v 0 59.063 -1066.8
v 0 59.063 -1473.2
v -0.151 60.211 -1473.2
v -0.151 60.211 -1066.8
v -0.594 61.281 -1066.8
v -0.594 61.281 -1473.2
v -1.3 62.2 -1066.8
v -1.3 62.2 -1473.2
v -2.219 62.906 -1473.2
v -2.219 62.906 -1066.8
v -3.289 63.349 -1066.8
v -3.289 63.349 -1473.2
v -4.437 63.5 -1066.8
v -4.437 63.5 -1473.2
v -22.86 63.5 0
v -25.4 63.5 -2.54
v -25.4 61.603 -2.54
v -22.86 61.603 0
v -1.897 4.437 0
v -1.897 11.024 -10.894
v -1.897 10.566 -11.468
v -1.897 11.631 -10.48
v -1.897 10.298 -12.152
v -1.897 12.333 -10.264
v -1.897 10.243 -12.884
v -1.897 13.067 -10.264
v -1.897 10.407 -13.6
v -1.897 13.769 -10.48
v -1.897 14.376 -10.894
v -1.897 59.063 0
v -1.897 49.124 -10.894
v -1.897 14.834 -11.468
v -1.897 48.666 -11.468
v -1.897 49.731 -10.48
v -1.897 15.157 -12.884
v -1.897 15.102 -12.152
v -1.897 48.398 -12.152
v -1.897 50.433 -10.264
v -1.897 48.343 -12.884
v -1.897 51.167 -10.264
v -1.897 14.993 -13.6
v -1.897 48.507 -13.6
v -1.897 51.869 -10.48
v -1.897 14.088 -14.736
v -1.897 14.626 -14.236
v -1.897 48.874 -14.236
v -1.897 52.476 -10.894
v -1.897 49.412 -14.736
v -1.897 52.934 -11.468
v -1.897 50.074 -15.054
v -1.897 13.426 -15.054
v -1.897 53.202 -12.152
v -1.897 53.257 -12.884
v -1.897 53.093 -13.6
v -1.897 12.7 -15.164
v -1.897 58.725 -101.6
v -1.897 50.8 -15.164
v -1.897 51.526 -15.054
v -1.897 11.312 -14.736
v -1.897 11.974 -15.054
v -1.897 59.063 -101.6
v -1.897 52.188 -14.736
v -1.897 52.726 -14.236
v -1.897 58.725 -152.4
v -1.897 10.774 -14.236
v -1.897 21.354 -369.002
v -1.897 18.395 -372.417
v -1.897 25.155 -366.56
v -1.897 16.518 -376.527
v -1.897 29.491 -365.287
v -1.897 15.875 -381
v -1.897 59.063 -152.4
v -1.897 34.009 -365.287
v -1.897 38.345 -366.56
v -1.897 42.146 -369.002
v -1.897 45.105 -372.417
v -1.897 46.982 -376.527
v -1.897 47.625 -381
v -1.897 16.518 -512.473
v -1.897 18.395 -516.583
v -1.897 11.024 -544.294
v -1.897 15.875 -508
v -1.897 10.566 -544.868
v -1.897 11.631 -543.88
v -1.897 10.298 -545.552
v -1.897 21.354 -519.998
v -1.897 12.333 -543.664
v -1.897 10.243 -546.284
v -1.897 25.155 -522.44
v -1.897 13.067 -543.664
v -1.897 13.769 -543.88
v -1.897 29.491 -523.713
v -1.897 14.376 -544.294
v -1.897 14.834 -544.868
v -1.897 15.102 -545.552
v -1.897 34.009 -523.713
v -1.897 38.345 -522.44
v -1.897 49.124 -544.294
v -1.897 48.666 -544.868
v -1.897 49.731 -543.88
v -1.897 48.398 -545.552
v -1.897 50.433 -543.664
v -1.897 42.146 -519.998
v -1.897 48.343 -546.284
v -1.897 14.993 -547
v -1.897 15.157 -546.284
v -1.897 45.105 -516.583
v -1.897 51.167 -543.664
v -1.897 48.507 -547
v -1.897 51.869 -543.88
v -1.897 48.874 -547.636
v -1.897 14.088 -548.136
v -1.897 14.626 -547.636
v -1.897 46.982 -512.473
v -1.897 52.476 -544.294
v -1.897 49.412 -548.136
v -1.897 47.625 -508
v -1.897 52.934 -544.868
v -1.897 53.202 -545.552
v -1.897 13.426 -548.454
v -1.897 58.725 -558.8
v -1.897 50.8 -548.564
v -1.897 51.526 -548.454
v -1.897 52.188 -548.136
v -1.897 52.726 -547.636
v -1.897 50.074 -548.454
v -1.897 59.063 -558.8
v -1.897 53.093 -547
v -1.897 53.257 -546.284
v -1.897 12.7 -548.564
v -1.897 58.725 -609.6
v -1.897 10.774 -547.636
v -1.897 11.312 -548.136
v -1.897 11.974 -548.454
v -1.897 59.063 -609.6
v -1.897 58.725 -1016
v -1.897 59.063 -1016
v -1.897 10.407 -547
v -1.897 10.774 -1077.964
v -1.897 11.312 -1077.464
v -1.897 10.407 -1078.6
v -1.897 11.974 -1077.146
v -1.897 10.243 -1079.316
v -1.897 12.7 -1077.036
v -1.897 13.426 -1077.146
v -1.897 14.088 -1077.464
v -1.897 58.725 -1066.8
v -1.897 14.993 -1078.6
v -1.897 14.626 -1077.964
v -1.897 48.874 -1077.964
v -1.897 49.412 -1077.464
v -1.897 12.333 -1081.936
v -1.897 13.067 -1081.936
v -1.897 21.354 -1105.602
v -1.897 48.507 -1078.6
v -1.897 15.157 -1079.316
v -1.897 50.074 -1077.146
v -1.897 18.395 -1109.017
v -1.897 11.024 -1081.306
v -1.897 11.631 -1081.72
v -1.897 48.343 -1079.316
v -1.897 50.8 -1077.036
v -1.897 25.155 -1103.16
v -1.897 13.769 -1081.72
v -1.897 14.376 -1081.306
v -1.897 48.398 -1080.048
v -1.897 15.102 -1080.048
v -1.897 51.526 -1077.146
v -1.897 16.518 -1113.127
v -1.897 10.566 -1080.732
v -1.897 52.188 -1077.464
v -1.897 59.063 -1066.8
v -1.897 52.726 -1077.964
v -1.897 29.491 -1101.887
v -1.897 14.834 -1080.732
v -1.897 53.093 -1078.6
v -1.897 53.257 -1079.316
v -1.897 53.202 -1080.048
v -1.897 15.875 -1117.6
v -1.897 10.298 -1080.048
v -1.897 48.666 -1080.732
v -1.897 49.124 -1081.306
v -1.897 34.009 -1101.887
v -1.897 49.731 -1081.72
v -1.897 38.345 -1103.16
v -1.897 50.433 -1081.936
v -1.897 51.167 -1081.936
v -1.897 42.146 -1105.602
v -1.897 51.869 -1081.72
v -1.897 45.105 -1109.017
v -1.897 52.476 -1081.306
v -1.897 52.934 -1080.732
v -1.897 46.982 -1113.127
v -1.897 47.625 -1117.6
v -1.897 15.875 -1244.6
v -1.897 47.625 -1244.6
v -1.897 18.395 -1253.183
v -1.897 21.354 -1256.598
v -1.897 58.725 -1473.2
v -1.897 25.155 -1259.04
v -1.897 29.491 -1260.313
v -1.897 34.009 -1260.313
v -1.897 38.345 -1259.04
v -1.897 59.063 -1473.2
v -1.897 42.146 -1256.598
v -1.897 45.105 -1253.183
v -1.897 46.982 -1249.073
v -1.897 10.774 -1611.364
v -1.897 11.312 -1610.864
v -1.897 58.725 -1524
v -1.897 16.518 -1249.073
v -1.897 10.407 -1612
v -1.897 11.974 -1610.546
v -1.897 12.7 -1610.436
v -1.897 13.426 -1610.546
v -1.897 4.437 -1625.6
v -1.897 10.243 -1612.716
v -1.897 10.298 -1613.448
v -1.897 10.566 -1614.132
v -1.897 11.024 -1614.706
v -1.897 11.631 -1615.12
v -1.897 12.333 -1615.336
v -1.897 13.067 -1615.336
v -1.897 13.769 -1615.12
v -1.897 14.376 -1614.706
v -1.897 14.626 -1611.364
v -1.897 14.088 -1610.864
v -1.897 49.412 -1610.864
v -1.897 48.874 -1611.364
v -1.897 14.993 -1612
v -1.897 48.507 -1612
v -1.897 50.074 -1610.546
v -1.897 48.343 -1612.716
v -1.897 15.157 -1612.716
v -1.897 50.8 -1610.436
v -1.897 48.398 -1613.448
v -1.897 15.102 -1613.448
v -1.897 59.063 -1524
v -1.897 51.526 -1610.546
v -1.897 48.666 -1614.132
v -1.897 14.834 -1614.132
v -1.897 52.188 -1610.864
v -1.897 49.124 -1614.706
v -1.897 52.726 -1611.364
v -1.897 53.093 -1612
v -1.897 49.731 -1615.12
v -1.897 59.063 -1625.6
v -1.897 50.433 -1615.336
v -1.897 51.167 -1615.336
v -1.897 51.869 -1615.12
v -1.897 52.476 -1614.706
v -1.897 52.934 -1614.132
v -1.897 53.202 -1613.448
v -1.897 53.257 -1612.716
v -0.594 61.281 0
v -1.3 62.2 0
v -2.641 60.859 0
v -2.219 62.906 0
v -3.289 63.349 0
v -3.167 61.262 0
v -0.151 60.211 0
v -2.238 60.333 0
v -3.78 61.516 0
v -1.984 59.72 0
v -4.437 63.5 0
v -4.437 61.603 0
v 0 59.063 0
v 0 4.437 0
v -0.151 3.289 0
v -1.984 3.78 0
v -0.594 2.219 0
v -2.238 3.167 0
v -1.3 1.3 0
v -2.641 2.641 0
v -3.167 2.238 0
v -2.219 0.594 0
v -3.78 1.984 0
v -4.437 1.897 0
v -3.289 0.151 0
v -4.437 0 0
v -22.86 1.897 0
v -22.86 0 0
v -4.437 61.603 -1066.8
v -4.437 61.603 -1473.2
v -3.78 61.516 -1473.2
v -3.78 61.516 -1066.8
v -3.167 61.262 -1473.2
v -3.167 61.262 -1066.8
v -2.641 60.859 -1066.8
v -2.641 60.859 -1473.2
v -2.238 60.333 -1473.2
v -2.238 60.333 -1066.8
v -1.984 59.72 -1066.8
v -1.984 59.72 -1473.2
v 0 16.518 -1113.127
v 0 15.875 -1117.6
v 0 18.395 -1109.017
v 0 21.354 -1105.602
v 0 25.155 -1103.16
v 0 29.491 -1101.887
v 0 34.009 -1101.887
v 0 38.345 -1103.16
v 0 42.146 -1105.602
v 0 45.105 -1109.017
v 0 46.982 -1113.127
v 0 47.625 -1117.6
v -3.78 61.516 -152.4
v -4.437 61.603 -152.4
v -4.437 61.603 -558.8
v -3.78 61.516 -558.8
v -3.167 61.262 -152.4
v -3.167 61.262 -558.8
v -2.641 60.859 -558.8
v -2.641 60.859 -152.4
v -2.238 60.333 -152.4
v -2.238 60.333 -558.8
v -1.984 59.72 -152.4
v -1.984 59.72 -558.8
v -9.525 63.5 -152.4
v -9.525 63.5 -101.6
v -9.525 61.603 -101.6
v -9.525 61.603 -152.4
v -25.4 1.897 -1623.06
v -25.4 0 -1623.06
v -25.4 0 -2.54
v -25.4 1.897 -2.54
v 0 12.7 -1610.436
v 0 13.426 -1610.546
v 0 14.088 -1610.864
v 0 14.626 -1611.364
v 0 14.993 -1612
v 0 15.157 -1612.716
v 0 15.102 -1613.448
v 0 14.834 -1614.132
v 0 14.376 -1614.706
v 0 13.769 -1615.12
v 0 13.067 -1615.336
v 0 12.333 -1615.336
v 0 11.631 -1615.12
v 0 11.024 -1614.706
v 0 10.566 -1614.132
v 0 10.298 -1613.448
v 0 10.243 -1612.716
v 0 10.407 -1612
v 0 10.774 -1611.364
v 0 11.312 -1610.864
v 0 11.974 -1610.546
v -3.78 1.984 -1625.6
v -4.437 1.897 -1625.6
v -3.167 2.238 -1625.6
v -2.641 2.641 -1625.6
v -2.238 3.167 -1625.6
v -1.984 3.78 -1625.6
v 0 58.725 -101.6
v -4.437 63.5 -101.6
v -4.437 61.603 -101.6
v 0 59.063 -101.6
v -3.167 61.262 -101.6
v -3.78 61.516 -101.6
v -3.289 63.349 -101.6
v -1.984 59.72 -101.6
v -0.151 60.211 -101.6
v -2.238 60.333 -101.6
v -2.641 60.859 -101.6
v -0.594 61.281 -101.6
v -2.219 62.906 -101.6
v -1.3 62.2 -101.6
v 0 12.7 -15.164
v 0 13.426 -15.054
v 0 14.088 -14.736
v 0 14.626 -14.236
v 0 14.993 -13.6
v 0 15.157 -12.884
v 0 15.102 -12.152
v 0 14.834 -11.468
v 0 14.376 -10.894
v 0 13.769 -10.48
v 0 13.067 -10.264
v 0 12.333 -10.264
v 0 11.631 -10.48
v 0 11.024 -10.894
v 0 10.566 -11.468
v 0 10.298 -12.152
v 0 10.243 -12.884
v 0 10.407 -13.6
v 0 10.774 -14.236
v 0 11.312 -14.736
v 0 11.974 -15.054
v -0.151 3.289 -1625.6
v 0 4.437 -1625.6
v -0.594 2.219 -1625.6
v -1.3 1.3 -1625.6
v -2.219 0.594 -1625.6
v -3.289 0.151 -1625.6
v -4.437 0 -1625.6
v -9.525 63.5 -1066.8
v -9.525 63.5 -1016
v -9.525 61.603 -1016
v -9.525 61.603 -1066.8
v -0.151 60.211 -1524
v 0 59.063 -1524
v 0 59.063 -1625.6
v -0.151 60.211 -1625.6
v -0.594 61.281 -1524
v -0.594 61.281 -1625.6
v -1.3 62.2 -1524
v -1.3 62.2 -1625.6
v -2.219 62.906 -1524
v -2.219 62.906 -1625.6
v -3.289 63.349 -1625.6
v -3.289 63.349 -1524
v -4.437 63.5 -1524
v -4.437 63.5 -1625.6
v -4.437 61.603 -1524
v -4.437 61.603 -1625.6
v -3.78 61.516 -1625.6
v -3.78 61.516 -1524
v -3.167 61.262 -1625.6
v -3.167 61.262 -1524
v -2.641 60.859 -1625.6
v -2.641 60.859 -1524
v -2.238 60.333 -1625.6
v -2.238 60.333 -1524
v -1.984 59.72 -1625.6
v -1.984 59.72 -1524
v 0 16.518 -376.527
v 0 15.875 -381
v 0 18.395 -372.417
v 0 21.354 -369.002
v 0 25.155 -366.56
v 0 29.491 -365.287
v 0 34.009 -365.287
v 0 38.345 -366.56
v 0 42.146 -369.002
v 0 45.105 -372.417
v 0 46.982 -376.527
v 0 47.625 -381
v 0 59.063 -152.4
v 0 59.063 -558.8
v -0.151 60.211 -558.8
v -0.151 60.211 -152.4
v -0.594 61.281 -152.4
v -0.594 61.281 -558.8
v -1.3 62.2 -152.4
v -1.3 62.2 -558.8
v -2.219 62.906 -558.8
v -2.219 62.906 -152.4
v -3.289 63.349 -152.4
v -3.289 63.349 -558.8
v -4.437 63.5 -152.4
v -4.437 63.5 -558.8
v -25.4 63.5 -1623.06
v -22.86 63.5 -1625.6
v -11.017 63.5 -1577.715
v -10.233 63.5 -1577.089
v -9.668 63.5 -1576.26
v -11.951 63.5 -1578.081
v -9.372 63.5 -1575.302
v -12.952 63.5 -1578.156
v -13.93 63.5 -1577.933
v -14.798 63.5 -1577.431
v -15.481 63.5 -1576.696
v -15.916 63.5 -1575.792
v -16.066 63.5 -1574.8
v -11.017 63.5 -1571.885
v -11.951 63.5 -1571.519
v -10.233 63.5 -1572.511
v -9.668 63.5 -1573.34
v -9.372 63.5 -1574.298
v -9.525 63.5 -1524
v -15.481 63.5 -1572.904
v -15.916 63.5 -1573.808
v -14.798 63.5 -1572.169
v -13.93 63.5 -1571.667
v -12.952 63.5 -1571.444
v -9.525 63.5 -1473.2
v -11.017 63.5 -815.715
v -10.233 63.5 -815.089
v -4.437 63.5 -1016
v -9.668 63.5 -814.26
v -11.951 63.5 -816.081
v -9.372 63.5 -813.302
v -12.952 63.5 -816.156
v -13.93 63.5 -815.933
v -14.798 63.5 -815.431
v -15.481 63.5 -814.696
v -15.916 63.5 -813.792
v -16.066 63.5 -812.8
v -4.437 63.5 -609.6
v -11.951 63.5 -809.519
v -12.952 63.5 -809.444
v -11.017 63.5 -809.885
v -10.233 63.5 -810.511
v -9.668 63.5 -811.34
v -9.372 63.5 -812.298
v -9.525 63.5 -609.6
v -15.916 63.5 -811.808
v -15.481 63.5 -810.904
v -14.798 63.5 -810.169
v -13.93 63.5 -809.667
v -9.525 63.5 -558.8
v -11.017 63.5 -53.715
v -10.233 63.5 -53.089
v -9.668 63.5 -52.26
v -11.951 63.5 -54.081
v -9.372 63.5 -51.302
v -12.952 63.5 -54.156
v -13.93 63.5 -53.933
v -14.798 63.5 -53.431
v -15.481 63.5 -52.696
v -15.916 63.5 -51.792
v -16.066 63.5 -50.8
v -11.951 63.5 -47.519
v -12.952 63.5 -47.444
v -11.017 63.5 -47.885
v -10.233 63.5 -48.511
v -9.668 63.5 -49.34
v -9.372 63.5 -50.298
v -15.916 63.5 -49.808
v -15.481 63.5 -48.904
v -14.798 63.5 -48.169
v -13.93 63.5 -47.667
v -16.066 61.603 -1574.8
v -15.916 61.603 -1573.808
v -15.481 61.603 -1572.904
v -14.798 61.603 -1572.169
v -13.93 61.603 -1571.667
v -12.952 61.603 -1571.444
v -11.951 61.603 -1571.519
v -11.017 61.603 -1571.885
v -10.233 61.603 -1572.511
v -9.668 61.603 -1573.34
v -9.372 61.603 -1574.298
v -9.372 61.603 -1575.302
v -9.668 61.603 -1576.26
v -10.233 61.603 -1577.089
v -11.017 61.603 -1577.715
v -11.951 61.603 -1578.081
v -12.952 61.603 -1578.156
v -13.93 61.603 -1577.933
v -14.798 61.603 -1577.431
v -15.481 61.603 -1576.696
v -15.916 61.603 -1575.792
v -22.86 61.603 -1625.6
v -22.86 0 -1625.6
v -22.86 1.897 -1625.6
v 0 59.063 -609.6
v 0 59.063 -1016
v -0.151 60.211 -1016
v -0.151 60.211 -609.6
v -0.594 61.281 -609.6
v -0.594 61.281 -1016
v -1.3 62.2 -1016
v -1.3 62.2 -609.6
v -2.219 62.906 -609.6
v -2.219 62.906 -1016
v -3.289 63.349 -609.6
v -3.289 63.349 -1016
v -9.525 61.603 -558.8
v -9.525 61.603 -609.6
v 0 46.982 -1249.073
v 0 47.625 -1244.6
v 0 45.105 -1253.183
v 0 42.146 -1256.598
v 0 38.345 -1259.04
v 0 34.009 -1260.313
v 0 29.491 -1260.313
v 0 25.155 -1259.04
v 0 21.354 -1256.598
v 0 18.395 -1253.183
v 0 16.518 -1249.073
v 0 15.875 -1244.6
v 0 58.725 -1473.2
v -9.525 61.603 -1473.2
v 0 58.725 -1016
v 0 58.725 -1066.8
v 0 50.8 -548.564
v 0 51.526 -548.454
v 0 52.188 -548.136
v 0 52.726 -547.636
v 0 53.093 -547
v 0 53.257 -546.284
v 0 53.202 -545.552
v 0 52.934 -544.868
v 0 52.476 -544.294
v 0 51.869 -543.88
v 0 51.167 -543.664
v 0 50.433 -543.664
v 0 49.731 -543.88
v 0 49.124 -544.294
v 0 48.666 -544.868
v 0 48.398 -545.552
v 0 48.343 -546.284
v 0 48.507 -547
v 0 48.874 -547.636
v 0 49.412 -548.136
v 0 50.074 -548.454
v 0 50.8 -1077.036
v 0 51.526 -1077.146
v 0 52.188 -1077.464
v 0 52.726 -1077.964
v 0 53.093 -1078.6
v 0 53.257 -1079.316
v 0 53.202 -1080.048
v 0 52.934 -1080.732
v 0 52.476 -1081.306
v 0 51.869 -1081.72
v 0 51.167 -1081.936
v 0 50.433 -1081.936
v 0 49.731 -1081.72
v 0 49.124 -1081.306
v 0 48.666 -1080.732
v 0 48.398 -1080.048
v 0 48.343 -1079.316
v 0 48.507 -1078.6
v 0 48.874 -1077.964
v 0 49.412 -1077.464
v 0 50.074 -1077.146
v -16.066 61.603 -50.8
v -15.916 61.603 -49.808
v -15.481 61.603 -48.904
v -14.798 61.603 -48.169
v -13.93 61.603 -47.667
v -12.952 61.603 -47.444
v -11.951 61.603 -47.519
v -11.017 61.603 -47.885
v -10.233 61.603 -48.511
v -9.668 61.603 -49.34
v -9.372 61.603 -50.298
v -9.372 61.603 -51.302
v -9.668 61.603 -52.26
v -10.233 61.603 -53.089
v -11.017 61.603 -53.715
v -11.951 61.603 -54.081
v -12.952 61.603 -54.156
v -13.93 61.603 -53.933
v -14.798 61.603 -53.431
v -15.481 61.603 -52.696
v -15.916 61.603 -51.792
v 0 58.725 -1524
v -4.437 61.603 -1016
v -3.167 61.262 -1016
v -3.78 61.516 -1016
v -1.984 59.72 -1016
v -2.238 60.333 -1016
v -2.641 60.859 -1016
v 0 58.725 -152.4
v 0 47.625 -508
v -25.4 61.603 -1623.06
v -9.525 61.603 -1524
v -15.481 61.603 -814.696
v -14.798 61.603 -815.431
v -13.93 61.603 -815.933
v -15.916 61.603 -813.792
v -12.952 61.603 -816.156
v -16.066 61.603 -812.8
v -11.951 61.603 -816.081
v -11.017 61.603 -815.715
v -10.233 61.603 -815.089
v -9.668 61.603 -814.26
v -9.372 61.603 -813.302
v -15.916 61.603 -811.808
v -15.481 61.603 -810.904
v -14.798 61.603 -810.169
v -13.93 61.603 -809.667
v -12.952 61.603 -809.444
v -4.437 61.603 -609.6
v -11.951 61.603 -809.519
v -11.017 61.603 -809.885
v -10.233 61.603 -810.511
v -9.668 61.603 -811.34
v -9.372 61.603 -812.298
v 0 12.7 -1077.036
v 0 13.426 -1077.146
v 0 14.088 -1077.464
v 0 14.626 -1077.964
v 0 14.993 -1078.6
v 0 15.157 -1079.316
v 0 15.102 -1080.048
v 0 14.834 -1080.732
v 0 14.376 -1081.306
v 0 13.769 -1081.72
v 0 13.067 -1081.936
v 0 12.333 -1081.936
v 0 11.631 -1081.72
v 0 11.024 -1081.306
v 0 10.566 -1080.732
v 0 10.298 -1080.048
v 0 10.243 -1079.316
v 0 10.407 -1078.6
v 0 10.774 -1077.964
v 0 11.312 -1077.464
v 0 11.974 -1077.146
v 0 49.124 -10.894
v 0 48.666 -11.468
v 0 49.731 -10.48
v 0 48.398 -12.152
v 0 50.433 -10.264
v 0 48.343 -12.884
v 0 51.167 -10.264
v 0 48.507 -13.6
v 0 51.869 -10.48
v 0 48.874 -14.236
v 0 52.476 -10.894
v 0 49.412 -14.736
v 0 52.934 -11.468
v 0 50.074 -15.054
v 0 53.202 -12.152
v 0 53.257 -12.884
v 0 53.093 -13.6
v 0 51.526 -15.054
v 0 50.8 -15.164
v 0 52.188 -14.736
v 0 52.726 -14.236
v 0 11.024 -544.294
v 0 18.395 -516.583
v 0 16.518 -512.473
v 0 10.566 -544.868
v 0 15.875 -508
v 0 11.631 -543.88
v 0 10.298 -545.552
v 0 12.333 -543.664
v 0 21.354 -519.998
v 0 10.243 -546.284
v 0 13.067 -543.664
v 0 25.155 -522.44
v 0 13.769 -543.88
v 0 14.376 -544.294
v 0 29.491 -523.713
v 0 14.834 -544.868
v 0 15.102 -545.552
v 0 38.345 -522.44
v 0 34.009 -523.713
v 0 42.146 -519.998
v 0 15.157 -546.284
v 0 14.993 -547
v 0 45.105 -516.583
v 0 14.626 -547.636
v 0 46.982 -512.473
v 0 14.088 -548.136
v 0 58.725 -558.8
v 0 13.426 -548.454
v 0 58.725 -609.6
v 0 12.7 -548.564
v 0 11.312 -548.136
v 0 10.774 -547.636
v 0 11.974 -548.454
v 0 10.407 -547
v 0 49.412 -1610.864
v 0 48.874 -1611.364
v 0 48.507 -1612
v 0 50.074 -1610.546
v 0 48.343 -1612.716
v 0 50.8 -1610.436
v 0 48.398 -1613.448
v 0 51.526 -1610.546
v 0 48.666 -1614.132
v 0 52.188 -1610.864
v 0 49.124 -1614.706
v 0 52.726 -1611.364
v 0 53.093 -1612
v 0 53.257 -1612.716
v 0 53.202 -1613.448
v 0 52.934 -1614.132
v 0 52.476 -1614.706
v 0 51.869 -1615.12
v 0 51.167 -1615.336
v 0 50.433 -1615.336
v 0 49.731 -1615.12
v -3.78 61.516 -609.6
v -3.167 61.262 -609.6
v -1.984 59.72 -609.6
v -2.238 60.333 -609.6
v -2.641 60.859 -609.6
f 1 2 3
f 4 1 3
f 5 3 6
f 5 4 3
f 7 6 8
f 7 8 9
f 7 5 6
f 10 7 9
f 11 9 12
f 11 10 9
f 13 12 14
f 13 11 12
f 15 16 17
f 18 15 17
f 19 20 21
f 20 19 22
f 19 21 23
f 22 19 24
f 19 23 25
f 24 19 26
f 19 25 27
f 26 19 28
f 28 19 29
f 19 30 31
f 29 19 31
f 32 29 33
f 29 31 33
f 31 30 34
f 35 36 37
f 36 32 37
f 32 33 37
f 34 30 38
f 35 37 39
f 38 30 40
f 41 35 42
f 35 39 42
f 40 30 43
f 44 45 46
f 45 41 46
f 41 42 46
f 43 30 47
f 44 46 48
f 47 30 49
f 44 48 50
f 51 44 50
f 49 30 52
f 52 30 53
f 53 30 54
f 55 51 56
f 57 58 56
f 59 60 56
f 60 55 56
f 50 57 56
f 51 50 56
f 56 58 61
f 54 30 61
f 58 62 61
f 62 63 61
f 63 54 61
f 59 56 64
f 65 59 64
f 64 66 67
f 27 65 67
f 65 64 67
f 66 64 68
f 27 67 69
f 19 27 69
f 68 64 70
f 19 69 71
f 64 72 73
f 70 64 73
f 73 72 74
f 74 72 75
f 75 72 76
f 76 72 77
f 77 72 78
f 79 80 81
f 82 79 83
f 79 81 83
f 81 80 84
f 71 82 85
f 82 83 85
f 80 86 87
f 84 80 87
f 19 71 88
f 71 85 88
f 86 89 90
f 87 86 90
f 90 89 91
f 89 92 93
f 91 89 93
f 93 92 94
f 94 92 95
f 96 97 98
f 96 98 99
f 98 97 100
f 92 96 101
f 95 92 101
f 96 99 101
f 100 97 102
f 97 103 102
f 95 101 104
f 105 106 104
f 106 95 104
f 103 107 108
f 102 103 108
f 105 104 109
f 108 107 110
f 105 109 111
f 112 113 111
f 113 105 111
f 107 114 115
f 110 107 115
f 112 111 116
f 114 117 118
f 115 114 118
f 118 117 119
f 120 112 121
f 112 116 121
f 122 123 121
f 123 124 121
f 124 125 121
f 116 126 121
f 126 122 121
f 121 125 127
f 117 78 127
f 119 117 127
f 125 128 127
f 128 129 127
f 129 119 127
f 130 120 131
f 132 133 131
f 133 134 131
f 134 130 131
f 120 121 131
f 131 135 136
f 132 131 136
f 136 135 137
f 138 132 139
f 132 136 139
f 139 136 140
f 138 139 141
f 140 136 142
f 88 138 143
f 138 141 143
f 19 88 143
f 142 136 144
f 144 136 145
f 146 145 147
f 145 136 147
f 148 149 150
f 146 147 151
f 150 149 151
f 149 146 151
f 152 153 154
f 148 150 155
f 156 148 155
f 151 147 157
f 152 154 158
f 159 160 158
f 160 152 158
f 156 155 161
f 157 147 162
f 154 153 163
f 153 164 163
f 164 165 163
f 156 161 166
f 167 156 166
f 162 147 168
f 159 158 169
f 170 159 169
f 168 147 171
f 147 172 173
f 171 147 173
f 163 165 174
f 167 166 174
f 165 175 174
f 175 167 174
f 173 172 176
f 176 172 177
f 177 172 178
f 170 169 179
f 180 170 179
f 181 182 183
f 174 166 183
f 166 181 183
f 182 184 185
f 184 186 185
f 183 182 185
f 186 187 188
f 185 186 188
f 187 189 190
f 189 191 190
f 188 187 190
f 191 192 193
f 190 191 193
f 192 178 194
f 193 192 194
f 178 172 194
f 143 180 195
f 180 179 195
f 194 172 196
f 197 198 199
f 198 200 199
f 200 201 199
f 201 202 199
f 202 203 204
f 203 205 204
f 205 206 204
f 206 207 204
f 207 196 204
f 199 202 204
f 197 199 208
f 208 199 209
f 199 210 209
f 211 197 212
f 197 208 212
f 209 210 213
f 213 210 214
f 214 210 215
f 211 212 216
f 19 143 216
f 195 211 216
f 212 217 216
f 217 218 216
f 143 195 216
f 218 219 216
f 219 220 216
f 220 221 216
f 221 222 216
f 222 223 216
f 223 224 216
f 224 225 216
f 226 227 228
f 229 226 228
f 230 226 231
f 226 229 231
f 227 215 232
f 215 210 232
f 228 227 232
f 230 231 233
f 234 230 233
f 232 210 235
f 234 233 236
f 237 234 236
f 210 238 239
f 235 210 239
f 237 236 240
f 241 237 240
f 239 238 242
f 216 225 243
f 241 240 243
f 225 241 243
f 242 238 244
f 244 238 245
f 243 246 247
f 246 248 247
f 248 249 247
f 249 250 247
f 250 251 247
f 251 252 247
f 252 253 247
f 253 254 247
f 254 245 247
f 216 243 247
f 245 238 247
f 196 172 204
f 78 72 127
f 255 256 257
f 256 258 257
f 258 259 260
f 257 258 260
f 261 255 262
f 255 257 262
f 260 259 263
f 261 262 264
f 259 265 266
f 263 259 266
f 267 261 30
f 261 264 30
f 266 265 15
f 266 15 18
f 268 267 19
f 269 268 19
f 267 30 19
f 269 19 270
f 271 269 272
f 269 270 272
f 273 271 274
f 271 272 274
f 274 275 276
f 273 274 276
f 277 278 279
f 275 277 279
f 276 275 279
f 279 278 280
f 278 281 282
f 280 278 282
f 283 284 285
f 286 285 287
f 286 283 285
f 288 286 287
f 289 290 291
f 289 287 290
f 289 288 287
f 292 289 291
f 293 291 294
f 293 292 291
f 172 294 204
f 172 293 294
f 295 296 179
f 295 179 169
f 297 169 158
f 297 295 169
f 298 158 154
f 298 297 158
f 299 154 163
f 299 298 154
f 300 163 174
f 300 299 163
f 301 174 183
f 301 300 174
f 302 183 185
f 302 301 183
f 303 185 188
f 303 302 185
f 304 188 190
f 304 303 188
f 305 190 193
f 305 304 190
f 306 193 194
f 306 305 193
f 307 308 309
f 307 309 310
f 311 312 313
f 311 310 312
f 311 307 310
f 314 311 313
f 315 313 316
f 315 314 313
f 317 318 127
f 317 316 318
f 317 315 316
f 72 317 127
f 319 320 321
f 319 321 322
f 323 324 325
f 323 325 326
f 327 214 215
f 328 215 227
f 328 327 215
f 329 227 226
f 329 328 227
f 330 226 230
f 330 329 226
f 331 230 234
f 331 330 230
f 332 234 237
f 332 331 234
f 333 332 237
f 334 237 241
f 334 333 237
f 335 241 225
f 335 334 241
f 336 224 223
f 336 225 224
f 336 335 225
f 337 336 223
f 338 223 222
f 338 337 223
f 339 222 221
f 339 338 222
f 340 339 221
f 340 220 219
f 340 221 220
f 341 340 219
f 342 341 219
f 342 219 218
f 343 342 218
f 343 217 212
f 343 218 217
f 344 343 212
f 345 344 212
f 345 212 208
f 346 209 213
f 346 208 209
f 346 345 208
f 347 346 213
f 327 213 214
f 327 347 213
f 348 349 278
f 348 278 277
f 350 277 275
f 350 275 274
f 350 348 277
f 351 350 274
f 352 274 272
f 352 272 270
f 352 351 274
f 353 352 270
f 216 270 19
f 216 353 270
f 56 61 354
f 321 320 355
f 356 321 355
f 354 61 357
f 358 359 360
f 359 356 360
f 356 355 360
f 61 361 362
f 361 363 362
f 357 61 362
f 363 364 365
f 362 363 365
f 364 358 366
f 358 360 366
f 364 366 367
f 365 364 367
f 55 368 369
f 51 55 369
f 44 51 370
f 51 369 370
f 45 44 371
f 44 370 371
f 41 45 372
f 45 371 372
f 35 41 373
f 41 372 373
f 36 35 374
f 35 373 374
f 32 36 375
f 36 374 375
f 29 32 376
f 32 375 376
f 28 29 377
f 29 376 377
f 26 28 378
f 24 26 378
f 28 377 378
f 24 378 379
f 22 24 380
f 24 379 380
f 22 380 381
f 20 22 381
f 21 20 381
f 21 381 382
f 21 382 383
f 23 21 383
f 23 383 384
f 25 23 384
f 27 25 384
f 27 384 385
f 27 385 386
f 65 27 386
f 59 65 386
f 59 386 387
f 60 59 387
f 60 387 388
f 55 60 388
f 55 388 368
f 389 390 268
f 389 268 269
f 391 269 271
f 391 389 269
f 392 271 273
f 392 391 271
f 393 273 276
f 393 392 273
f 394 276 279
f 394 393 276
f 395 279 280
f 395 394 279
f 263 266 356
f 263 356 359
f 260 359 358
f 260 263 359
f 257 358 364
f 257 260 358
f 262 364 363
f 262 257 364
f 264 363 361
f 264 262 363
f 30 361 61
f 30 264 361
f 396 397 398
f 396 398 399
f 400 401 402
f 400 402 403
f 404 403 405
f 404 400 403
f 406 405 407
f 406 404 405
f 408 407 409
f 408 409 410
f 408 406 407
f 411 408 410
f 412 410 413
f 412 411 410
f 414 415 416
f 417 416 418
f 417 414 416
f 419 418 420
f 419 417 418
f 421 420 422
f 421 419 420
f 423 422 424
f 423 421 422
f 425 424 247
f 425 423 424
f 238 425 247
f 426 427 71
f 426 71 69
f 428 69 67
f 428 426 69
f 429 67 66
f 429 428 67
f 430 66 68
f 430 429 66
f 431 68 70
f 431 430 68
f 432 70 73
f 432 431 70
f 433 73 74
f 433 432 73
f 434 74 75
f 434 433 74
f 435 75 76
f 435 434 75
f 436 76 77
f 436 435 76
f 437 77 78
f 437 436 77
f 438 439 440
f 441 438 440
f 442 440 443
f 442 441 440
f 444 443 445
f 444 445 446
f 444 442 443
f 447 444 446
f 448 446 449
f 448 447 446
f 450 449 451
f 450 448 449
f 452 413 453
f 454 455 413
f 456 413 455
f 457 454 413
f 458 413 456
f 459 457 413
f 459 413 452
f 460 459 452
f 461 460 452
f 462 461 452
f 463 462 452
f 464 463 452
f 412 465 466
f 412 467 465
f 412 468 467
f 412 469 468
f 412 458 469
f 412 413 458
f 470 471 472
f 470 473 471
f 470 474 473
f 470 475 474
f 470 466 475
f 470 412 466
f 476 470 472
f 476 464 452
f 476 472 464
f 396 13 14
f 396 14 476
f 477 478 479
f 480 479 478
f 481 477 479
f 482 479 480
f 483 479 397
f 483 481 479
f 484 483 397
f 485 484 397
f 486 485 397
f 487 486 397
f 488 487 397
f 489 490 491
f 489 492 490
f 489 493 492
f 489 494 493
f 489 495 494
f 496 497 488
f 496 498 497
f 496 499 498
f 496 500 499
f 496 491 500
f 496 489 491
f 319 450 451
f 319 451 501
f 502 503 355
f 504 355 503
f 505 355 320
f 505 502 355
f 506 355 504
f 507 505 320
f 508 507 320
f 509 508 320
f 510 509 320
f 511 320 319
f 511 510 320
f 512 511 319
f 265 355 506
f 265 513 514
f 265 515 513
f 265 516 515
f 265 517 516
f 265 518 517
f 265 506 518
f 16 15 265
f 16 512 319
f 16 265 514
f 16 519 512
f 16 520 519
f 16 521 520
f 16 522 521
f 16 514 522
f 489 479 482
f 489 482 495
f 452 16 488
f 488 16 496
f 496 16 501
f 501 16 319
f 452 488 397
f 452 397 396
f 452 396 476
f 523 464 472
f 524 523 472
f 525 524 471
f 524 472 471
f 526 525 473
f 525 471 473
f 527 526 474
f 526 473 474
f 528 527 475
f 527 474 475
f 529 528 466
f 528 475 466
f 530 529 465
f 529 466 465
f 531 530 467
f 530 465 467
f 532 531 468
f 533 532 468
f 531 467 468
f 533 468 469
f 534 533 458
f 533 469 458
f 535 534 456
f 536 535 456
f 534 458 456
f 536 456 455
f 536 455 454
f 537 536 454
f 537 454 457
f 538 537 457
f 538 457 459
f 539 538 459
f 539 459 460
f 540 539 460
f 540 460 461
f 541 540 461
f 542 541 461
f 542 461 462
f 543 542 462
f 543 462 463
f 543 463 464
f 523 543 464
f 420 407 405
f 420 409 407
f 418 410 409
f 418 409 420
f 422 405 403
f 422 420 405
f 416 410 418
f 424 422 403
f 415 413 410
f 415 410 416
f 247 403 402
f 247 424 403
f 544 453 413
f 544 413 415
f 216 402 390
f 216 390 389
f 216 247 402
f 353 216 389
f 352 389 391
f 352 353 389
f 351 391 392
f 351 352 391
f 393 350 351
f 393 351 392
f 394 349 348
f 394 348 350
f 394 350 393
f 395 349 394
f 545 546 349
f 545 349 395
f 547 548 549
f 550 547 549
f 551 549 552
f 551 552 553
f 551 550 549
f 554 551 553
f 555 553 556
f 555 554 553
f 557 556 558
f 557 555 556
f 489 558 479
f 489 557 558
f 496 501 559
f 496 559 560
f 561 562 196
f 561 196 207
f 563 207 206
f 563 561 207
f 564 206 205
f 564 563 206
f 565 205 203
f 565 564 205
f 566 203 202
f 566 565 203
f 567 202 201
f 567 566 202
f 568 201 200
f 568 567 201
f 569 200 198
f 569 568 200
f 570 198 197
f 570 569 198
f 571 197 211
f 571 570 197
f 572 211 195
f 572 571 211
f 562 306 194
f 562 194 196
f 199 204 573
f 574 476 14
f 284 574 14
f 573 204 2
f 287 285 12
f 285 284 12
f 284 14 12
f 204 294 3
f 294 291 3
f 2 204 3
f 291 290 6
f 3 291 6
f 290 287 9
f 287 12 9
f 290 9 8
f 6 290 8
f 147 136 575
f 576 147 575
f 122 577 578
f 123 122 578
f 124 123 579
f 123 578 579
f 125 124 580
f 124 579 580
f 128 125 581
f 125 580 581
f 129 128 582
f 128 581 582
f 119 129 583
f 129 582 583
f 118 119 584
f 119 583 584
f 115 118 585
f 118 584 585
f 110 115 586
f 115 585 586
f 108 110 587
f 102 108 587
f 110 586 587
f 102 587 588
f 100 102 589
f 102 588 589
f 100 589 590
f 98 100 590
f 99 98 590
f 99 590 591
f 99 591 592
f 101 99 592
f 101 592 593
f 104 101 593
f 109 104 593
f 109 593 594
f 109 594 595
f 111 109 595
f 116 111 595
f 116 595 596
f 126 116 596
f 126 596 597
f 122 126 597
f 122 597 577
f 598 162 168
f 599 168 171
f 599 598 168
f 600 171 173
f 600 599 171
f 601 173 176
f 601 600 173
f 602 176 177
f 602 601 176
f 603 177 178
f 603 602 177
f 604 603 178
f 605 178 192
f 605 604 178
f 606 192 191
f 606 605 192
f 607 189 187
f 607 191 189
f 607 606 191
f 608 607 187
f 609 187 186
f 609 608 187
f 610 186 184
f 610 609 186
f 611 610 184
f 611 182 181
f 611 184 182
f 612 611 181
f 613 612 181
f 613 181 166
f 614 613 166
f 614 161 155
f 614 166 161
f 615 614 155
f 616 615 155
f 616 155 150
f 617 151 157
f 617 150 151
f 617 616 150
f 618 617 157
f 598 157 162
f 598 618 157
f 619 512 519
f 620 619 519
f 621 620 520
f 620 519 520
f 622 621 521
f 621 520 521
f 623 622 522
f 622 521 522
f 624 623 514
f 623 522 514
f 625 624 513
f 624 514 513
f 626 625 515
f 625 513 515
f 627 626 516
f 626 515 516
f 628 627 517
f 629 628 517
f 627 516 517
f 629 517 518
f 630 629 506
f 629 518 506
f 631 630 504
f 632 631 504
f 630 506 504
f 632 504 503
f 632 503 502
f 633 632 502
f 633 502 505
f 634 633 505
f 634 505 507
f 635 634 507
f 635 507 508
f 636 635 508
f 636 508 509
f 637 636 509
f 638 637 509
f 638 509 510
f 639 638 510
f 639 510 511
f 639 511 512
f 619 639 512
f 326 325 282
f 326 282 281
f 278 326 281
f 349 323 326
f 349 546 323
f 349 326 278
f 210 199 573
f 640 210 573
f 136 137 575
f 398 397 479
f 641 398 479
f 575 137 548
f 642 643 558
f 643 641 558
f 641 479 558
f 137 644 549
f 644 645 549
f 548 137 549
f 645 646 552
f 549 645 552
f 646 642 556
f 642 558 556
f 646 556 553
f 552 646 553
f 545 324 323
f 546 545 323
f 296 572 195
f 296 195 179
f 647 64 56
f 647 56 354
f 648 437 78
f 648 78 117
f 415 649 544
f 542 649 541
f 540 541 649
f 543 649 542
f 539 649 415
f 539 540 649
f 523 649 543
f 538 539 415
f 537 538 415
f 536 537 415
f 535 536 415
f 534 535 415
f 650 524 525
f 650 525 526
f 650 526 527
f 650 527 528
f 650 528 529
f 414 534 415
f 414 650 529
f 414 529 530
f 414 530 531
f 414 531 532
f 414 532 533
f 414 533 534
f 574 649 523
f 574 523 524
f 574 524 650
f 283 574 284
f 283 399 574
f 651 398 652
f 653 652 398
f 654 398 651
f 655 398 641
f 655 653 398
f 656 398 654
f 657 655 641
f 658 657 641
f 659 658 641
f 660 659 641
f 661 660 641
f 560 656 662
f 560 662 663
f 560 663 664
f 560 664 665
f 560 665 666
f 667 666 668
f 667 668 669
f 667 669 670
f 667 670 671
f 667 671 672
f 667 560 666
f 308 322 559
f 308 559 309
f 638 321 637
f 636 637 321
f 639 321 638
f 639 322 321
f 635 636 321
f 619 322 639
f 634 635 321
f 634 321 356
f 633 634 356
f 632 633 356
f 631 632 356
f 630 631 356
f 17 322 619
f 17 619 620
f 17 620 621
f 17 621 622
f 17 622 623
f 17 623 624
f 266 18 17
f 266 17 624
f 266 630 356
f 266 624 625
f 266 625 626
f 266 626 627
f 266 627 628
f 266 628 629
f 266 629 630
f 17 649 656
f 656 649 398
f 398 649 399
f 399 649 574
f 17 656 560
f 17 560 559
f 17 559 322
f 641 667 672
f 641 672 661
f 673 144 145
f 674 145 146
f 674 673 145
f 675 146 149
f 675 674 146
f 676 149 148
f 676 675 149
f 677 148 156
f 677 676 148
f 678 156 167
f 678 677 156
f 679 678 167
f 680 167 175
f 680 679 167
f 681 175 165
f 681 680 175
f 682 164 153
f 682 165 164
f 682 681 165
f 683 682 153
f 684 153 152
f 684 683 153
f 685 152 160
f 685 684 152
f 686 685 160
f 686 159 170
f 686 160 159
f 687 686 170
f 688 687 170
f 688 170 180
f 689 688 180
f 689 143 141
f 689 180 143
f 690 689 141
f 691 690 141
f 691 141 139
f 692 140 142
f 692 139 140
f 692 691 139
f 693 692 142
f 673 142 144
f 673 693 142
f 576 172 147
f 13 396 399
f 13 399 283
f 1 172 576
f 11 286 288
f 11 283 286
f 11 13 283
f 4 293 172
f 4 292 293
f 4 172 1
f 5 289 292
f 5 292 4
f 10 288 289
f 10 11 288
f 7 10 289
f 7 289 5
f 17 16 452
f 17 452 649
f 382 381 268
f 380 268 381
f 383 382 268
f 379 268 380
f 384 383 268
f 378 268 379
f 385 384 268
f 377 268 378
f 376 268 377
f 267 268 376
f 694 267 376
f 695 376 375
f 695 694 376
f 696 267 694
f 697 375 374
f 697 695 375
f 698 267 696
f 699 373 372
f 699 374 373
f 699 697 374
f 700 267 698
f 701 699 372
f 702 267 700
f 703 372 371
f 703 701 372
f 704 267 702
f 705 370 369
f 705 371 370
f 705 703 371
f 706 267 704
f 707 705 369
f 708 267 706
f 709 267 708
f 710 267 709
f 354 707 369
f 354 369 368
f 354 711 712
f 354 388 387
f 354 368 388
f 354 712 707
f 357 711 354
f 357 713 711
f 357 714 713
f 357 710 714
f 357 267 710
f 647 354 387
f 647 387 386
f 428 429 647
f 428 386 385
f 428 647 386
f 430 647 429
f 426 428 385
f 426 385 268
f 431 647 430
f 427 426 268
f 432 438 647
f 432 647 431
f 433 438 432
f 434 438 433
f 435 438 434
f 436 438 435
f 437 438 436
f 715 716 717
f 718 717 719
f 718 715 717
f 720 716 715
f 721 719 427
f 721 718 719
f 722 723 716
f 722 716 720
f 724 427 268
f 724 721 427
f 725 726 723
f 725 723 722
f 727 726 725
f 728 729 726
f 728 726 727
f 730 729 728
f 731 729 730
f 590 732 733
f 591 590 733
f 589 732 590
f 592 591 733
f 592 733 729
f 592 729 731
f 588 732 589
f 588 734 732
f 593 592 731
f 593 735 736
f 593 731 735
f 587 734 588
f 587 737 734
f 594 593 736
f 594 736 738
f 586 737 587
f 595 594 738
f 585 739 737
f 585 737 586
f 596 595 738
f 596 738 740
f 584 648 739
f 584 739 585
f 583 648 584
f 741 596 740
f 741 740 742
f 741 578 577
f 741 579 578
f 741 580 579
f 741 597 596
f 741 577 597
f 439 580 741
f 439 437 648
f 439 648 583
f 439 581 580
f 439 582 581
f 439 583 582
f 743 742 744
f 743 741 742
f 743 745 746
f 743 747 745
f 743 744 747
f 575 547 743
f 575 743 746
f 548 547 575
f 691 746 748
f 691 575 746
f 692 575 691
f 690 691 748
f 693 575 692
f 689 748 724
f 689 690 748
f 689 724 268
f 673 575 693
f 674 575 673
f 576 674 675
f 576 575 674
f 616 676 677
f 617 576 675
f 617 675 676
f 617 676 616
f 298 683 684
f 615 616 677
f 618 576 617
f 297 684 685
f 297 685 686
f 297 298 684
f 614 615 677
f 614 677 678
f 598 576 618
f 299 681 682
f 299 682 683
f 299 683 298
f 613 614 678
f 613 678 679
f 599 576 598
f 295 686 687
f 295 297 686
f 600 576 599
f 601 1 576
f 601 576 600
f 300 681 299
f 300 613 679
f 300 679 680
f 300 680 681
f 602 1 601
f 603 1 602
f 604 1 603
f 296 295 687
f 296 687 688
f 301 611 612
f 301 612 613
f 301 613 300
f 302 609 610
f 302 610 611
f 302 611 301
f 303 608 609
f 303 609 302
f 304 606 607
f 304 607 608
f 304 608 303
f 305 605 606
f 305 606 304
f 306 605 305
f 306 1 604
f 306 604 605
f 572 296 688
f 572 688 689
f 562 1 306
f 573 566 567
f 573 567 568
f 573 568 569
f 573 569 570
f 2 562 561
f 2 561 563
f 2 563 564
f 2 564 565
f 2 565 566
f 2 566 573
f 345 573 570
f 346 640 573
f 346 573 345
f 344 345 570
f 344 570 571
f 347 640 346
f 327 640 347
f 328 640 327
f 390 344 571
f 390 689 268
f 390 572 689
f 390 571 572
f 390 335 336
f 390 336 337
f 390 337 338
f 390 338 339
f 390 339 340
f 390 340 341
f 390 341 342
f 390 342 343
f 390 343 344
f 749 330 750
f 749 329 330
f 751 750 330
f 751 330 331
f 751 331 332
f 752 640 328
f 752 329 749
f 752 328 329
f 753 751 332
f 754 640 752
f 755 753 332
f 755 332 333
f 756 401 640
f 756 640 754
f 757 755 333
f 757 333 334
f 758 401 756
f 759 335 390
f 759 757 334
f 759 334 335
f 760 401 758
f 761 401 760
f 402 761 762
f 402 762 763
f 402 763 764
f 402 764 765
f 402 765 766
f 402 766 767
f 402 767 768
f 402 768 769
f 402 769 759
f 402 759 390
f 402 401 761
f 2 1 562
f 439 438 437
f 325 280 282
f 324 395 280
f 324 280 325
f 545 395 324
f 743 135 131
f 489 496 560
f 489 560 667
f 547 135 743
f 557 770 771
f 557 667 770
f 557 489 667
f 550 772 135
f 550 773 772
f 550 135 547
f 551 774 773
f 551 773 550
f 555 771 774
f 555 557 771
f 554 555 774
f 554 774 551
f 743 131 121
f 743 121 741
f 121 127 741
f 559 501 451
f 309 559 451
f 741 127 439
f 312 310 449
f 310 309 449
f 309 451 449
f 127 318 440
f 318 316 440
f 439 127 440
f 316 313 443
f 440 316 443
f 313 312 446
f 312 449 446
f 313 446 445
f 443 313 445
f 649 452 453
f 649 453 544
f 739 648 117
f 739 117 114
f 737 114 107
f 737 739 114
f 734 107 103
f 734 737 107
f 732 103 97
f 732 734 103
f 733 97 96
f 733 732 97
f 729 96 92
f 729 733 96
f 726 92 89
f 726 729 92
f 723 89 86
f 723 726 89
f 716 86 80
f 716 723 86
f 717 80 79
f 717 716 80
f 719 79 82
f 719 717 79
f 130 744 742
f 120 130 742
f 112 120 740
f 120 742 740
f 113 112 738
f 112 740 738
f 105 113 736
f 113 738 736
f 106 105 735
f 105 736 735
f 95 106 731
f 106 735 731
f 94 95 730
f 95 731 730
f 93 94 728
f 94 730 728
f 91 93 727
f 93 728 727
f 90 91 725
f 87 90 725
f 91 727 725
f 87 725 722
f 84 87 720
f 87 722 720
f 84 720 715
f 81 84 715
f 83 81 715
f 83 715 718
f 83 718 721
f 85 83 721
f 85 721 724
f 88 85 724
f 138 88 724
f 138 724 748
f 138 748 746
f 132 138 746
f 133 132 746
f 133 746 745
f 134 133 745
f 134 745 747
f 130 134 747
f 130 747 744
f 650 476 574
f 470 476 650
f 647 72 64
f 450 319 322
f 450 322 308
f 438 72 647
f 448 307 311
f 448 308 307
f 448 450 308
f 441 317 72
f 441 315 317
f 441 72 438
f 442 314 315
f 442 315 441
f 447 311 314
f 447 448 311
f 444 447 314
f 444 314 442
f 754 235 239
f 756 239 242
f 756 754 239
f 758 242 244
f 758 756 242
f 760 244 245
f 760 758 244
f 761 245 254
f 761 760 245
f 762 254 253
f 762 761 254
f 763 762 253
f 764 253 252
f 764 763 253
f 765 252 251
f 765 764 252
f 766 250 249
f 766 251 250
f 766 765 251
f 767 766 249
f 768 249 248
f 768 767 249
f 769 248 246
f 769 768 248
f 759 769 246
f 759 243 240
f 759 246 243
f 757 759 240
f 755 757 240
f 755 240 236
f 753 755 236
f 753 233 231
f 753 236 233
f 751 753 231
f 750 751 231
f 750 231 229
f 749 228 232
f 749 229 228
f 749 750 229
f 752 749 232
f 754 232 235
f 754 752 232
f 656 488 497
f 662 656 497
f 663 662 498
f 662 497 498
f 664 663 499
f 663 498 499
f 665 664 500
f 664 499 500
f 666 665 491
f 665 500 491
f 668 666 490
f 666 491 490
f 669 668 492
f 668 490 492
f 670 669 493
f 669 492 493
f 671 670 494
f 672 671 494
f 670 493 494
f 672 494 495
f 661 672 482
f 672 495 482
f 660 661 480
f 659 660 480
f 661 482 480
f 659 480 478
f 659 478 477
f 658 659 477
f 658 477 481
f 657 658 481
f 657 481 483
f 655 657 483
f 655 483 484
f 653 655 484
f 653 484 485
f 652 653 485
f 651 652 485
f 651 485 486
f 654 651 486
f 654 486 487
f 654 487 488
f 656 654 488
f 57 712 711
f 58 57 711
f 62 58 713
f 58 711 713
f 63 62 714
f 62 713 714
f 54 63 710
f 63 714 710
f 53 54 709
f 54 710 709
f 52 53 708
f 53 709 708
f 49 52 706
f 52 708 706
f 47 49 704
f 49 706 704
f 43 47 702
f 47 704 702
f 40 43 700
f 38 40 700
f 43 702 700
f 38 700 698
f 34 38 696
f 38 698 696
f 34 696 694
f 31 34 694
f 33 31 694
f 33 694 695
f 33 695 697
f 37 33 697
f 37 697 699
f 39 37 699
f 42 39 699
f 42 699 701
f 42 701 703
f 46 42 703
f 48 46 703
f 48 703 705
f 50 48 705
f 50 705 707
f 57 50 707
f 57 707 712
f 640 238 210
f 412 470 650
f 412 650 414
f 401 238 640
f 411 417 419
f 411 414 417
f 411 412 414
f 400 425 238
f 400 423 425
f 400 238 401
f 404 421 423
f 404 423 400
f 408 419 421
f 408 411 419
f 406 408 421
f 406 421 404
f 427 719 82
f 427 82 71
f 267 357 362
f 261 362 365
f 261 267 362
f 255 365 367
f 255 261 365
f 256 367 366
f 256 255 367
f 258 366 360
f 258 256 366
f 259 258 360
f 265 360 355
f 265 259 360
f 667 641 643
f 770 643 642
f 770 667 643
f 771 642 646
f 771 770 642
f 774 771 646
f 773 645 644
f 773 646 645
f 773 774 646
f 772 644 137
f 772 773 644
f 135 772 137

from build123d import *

# Parameters (mm, degrees)
SKETCH1_W                      = 1625.6
SKETCH1_H                      = 63.5
BASE_FLANGE1_DEPTH             = 1.89738
EDGE_FLANGE1_STRIP_W           = 12.66952
EDGE_FLANGE1_STRIP_H           = 1.89738
EDGE_FLANGE1_STRIP_CUT_DEPTH   = 1625.6
EDGE_FLANGE1_STRIP_2_W         = 12.66952
EDGE_FLANGE1_STRIP_2_H         = 1.89738
EDGE_FLANGE1_STRIP_CUT_2_DEPTH = 1625.6
EDGE_FLANGE1_DEPTH             = 1625.6
EDGE_FLANGE1_BEND_DEPTH        = 1625.6
SKETCH15_W                     = 9.525
SKETCH15_H                     = 50.8
CUT_EXTRUDE2_DEPTH             = 4.7752
LPATTERN3_COUNT                = 4
LPATTERN3_PITCH                = 457.2
SKETCH16_R                     = 3.3655
CUT_EXTRUDE3_DEPTH             = 2.54
LPATTERN4_COUNT                = 3
LPATTERN4_PITCH                = 762
CUT_EXTRUDE4_DEPTH             = 2.54
LPATTERN5_COUNT                = 2
LPATTERN5_PITCH                = 736.6
SKETCH18_R                     = 2.4638
CUT_EXTRUDE5_DEPTH             = 1628.038035818
SKETCH19_R                     = 2.4638
CUT_EXTRUDE6_DEPTH             = 1628.038035818
CHAMFER1_SIZE                  = 2.54


# Sheet-metal steps are written as plain solids
with BuildPart() as part:
    # Sketch1 → Base-Flange1 (new body)
    with BuildSketch(Plane(origin=(0, 0, 0), x_dir=(0, 0, -1), z_dir=(1, 0, 0))):
        with Locations((812.8, 31.75)):
            Rectangle(SKETCH1_W, SKETCH1_H)
    extrude(amount=-BASE_FLANGE1_DEPTH)

    # Edge-Flange1 strip (across the edge) → Edge-Flange1 strip cut (cut)
    with BuildSketch(Plane(origin=(-1.89738, 63.5, 0), x_dir=(0, -1, 0), z_dir=(0, 0, -1))):
        with Locations((-1.89738, -0.94869)):
            Rectangle(EDGE_FLANGE1_STRIP_W, EDGE_FLANGE1_STRIP_H)
    extrude(amount=EDGE_FLANGE1_STRIP_CUT_DEPTH, mode=Mode.SUBTRACT)

    # Edge-Flange1 strip 2 (across the edge) → Edge-Flange1 strip cut 2 (cut)
    with BuildSketch(Plane(origin=(-1.89738, 0, -1625.6), x_dir=(0, 1, 0), z_dir=(0, 0, 1))):
        with Locations((-1.89738, -0.94869)):
            Rectangle(EDGE_FLANGE1_STRIP_2_W, EDGE_FLANGE1_STRIP_2_H)
    extrude(amount=EDGE_FLANGE1_STRIP_CUT_2_DEPTH, mode=Mode.SUBTRACT)

    # Edge-Flange1 section (across the edge) → Edge-Flange1 (add)
    with BuildSketch(Plane(origin=(-1.89738, 63.5, 0), x_dir=(0, -1, 0), z_dir=(0, 0, -1))):
        with BuildLine():
            Line((0, 2.54), (0, 23.50262))
            Line((0, 23.50262), (1.89738, 23.50262))
            Line((1.89738, 23.50262), (1.89738, 2.54))
            ThreePointArc((1.89738, 2.54), (2.641328776, 0.743948776), (4.43738, 0))
            Line((4.43738, 0), (4.43738, -1.89738))
            ThreePointArc((4.43738, -1.89738), (1.299678511, -0.597701489), (0, 2.54))
        make_face()
    extrude(amount=EDGE_FLANGE1_DEPTH)

    # Edge-Flange1 section 2 (across the edge) → Edge-Flange1 bend (add)
    with BuildSketch(Plane(origin=(-1.89738, 0, -1625.6), x_dir=(0, 1, 0), z_dir=(0, 0, 1))):
        with BuildLine():
            Line((0, 2.54), (0, 23.50262))
            Line((0, 23.50262), (1.89738, 23.50262))
            Line((1.89738, 23.50262), (1.89738, 2.54))
            ThreePointArc((1.89738, 2.54), (2.641328776, 0.743948776), (4.43738, 0))
            Line((4.43738, 0), (4.43738, -1.89738))
            ThreePointArc((4.43738, -1.89738), (1.299678511, -0.597701489), (0, 2.54))
        make_face()
    extrude(amount=EDGE_FLANGE1_BEND_DEPTH)

    # Sketch15 → Cut-Extrude2 (cut)
    with BuildSketch(Plane(origin=(0, 63.5, 0), x_dir=(1, 0, 0), z_dir=(0, 1, 0))):
        with Locations((-4.7625, 127)):
            Rectangle(SKETCH15_W, SKETCH15_H)
    cut_extrude2 = extrude(amount=-CUT_EXTRUDE2_DEPTH, mode=Mode.SUBTRACT)

    # LPattern3: Cut-Extrude2 ×4
    with Locations(*[(0, 0, -i * LPATTERN3_PITCH) for i in range(1, LPATTERN3_COUNT)]):
        add(cut_extrude2, mode=Mode.SUBTRACT)

    # Sketch16 → Cut-Extrude3 (cut)
    with BuildSketch(Plane(origin=(0, 63.5, 0), x_dir=(1, 0, 0), z_dir=(0, 1, 0))):
        with Locations(Location((-12.7, 1574.8, 0), (0, 0, 180))):
            Circle(SKETCH16_R)
    cut_extrude3 = extrude(amount=-CUT_EXTRUDE3_DEPTH, mode=Mode.SUBTRACT)

    # LPattern4: Cut-Extrude3 ×3
    with Locations(*[(0, 0, i * LPATTERN4_PITCH) for i in range(1, LPATTERN4_COUNT)]):
        add(cut_extrude3, mode=Mode.SUBTRACT)

    # Sketch17 → Cut-Extrude4 (cut)
    with BuildSketch(Plane(origin=(0, 0, 0), x_dir=(0, 0, -1), z_dir=(1, 0, 0))):
        with BuildLine():
            Line((381, 47.625), (508, 47.625))
            ThreePointArc((508, 47.625), (523.875, 31.75), (508, 15.875))
            Line((508, 15.875), (381, 15.875))
            ThreePointArc((381, 15.875), (365.125, 31.75), (381, 47.625))
        make_face()
    cut_extrude4 = extrude(amount=-CUT_EXTRUDE4_DEPTH, mode=Mode.SUBTRACT)

    # LPattern5: Cut-Extrude4 ×2
    with Locations(*[(0, 0, -i * LPATTERN5_PITCH) for i in range(1, LPATTERN5_COUNT)]):
        add(cut_extrude4, mode=Mode.SUBTRACT)

    # Sketch18 → Cut-Extrude5 (cut, through all)
    with BuildSketch(Plane(origin=(0, 0, 0), x_dir=(0, 0, -1), z_dir=(1, 0, 0))):
        with Locations((546.1, 50.8)):
            Circle(SKETCH18_R)
        with Locations((546.1, 12.7)):
            Circle(SKETCH18_R)
    cut_extrude5 = extrude(amount=-CUT_EXTRUDE5_DEPTH, mode=Mode.SUBTRACT)

    # Sketch19 → Cut-Extrude6 (cut, through all)
    with BuildSketch(Plane(origin=(0, 0, 0), x_dir=(0, 0, -1), z_dir=(1, 0, 0))):
        with Locations((12.7, 50.8)):
            Circle(SKETCH19_R)
        with Locations((12.7, 12.7)):
            Circle(SKETCH19_R)
    cut_extrude6 = extrude(amount=-CUT_EXTRUDE6_DEPTH, mode=Mode.SUBTRACT)

    # Mirror1: Cut-Extrude5, Cut-Extrude6 across plane
    add(cut_extrude5.mirror(Plane.XY.offset(-812.8)), mode=Mode.SUBTRACT)
    add(cut_extrude6.mirror(Plane.XY.offset(-812.8)), mode=Mode.SUBTRACT)

    # Chamfer1
    chamfer1_edges = [part.edges().sort_by_distance(p)[0] for p in [
        (-25.4, 62.55131, 0),
        (-25.4, 62.55131, -1625.6),
        (-25.4, 0.94869, -1625.6),
        (-25.4, 0.94869, 0),
    ]]
    chamfer(chamfer1_edges, length=CHAMFER1_SIZE)


solid = part.part
